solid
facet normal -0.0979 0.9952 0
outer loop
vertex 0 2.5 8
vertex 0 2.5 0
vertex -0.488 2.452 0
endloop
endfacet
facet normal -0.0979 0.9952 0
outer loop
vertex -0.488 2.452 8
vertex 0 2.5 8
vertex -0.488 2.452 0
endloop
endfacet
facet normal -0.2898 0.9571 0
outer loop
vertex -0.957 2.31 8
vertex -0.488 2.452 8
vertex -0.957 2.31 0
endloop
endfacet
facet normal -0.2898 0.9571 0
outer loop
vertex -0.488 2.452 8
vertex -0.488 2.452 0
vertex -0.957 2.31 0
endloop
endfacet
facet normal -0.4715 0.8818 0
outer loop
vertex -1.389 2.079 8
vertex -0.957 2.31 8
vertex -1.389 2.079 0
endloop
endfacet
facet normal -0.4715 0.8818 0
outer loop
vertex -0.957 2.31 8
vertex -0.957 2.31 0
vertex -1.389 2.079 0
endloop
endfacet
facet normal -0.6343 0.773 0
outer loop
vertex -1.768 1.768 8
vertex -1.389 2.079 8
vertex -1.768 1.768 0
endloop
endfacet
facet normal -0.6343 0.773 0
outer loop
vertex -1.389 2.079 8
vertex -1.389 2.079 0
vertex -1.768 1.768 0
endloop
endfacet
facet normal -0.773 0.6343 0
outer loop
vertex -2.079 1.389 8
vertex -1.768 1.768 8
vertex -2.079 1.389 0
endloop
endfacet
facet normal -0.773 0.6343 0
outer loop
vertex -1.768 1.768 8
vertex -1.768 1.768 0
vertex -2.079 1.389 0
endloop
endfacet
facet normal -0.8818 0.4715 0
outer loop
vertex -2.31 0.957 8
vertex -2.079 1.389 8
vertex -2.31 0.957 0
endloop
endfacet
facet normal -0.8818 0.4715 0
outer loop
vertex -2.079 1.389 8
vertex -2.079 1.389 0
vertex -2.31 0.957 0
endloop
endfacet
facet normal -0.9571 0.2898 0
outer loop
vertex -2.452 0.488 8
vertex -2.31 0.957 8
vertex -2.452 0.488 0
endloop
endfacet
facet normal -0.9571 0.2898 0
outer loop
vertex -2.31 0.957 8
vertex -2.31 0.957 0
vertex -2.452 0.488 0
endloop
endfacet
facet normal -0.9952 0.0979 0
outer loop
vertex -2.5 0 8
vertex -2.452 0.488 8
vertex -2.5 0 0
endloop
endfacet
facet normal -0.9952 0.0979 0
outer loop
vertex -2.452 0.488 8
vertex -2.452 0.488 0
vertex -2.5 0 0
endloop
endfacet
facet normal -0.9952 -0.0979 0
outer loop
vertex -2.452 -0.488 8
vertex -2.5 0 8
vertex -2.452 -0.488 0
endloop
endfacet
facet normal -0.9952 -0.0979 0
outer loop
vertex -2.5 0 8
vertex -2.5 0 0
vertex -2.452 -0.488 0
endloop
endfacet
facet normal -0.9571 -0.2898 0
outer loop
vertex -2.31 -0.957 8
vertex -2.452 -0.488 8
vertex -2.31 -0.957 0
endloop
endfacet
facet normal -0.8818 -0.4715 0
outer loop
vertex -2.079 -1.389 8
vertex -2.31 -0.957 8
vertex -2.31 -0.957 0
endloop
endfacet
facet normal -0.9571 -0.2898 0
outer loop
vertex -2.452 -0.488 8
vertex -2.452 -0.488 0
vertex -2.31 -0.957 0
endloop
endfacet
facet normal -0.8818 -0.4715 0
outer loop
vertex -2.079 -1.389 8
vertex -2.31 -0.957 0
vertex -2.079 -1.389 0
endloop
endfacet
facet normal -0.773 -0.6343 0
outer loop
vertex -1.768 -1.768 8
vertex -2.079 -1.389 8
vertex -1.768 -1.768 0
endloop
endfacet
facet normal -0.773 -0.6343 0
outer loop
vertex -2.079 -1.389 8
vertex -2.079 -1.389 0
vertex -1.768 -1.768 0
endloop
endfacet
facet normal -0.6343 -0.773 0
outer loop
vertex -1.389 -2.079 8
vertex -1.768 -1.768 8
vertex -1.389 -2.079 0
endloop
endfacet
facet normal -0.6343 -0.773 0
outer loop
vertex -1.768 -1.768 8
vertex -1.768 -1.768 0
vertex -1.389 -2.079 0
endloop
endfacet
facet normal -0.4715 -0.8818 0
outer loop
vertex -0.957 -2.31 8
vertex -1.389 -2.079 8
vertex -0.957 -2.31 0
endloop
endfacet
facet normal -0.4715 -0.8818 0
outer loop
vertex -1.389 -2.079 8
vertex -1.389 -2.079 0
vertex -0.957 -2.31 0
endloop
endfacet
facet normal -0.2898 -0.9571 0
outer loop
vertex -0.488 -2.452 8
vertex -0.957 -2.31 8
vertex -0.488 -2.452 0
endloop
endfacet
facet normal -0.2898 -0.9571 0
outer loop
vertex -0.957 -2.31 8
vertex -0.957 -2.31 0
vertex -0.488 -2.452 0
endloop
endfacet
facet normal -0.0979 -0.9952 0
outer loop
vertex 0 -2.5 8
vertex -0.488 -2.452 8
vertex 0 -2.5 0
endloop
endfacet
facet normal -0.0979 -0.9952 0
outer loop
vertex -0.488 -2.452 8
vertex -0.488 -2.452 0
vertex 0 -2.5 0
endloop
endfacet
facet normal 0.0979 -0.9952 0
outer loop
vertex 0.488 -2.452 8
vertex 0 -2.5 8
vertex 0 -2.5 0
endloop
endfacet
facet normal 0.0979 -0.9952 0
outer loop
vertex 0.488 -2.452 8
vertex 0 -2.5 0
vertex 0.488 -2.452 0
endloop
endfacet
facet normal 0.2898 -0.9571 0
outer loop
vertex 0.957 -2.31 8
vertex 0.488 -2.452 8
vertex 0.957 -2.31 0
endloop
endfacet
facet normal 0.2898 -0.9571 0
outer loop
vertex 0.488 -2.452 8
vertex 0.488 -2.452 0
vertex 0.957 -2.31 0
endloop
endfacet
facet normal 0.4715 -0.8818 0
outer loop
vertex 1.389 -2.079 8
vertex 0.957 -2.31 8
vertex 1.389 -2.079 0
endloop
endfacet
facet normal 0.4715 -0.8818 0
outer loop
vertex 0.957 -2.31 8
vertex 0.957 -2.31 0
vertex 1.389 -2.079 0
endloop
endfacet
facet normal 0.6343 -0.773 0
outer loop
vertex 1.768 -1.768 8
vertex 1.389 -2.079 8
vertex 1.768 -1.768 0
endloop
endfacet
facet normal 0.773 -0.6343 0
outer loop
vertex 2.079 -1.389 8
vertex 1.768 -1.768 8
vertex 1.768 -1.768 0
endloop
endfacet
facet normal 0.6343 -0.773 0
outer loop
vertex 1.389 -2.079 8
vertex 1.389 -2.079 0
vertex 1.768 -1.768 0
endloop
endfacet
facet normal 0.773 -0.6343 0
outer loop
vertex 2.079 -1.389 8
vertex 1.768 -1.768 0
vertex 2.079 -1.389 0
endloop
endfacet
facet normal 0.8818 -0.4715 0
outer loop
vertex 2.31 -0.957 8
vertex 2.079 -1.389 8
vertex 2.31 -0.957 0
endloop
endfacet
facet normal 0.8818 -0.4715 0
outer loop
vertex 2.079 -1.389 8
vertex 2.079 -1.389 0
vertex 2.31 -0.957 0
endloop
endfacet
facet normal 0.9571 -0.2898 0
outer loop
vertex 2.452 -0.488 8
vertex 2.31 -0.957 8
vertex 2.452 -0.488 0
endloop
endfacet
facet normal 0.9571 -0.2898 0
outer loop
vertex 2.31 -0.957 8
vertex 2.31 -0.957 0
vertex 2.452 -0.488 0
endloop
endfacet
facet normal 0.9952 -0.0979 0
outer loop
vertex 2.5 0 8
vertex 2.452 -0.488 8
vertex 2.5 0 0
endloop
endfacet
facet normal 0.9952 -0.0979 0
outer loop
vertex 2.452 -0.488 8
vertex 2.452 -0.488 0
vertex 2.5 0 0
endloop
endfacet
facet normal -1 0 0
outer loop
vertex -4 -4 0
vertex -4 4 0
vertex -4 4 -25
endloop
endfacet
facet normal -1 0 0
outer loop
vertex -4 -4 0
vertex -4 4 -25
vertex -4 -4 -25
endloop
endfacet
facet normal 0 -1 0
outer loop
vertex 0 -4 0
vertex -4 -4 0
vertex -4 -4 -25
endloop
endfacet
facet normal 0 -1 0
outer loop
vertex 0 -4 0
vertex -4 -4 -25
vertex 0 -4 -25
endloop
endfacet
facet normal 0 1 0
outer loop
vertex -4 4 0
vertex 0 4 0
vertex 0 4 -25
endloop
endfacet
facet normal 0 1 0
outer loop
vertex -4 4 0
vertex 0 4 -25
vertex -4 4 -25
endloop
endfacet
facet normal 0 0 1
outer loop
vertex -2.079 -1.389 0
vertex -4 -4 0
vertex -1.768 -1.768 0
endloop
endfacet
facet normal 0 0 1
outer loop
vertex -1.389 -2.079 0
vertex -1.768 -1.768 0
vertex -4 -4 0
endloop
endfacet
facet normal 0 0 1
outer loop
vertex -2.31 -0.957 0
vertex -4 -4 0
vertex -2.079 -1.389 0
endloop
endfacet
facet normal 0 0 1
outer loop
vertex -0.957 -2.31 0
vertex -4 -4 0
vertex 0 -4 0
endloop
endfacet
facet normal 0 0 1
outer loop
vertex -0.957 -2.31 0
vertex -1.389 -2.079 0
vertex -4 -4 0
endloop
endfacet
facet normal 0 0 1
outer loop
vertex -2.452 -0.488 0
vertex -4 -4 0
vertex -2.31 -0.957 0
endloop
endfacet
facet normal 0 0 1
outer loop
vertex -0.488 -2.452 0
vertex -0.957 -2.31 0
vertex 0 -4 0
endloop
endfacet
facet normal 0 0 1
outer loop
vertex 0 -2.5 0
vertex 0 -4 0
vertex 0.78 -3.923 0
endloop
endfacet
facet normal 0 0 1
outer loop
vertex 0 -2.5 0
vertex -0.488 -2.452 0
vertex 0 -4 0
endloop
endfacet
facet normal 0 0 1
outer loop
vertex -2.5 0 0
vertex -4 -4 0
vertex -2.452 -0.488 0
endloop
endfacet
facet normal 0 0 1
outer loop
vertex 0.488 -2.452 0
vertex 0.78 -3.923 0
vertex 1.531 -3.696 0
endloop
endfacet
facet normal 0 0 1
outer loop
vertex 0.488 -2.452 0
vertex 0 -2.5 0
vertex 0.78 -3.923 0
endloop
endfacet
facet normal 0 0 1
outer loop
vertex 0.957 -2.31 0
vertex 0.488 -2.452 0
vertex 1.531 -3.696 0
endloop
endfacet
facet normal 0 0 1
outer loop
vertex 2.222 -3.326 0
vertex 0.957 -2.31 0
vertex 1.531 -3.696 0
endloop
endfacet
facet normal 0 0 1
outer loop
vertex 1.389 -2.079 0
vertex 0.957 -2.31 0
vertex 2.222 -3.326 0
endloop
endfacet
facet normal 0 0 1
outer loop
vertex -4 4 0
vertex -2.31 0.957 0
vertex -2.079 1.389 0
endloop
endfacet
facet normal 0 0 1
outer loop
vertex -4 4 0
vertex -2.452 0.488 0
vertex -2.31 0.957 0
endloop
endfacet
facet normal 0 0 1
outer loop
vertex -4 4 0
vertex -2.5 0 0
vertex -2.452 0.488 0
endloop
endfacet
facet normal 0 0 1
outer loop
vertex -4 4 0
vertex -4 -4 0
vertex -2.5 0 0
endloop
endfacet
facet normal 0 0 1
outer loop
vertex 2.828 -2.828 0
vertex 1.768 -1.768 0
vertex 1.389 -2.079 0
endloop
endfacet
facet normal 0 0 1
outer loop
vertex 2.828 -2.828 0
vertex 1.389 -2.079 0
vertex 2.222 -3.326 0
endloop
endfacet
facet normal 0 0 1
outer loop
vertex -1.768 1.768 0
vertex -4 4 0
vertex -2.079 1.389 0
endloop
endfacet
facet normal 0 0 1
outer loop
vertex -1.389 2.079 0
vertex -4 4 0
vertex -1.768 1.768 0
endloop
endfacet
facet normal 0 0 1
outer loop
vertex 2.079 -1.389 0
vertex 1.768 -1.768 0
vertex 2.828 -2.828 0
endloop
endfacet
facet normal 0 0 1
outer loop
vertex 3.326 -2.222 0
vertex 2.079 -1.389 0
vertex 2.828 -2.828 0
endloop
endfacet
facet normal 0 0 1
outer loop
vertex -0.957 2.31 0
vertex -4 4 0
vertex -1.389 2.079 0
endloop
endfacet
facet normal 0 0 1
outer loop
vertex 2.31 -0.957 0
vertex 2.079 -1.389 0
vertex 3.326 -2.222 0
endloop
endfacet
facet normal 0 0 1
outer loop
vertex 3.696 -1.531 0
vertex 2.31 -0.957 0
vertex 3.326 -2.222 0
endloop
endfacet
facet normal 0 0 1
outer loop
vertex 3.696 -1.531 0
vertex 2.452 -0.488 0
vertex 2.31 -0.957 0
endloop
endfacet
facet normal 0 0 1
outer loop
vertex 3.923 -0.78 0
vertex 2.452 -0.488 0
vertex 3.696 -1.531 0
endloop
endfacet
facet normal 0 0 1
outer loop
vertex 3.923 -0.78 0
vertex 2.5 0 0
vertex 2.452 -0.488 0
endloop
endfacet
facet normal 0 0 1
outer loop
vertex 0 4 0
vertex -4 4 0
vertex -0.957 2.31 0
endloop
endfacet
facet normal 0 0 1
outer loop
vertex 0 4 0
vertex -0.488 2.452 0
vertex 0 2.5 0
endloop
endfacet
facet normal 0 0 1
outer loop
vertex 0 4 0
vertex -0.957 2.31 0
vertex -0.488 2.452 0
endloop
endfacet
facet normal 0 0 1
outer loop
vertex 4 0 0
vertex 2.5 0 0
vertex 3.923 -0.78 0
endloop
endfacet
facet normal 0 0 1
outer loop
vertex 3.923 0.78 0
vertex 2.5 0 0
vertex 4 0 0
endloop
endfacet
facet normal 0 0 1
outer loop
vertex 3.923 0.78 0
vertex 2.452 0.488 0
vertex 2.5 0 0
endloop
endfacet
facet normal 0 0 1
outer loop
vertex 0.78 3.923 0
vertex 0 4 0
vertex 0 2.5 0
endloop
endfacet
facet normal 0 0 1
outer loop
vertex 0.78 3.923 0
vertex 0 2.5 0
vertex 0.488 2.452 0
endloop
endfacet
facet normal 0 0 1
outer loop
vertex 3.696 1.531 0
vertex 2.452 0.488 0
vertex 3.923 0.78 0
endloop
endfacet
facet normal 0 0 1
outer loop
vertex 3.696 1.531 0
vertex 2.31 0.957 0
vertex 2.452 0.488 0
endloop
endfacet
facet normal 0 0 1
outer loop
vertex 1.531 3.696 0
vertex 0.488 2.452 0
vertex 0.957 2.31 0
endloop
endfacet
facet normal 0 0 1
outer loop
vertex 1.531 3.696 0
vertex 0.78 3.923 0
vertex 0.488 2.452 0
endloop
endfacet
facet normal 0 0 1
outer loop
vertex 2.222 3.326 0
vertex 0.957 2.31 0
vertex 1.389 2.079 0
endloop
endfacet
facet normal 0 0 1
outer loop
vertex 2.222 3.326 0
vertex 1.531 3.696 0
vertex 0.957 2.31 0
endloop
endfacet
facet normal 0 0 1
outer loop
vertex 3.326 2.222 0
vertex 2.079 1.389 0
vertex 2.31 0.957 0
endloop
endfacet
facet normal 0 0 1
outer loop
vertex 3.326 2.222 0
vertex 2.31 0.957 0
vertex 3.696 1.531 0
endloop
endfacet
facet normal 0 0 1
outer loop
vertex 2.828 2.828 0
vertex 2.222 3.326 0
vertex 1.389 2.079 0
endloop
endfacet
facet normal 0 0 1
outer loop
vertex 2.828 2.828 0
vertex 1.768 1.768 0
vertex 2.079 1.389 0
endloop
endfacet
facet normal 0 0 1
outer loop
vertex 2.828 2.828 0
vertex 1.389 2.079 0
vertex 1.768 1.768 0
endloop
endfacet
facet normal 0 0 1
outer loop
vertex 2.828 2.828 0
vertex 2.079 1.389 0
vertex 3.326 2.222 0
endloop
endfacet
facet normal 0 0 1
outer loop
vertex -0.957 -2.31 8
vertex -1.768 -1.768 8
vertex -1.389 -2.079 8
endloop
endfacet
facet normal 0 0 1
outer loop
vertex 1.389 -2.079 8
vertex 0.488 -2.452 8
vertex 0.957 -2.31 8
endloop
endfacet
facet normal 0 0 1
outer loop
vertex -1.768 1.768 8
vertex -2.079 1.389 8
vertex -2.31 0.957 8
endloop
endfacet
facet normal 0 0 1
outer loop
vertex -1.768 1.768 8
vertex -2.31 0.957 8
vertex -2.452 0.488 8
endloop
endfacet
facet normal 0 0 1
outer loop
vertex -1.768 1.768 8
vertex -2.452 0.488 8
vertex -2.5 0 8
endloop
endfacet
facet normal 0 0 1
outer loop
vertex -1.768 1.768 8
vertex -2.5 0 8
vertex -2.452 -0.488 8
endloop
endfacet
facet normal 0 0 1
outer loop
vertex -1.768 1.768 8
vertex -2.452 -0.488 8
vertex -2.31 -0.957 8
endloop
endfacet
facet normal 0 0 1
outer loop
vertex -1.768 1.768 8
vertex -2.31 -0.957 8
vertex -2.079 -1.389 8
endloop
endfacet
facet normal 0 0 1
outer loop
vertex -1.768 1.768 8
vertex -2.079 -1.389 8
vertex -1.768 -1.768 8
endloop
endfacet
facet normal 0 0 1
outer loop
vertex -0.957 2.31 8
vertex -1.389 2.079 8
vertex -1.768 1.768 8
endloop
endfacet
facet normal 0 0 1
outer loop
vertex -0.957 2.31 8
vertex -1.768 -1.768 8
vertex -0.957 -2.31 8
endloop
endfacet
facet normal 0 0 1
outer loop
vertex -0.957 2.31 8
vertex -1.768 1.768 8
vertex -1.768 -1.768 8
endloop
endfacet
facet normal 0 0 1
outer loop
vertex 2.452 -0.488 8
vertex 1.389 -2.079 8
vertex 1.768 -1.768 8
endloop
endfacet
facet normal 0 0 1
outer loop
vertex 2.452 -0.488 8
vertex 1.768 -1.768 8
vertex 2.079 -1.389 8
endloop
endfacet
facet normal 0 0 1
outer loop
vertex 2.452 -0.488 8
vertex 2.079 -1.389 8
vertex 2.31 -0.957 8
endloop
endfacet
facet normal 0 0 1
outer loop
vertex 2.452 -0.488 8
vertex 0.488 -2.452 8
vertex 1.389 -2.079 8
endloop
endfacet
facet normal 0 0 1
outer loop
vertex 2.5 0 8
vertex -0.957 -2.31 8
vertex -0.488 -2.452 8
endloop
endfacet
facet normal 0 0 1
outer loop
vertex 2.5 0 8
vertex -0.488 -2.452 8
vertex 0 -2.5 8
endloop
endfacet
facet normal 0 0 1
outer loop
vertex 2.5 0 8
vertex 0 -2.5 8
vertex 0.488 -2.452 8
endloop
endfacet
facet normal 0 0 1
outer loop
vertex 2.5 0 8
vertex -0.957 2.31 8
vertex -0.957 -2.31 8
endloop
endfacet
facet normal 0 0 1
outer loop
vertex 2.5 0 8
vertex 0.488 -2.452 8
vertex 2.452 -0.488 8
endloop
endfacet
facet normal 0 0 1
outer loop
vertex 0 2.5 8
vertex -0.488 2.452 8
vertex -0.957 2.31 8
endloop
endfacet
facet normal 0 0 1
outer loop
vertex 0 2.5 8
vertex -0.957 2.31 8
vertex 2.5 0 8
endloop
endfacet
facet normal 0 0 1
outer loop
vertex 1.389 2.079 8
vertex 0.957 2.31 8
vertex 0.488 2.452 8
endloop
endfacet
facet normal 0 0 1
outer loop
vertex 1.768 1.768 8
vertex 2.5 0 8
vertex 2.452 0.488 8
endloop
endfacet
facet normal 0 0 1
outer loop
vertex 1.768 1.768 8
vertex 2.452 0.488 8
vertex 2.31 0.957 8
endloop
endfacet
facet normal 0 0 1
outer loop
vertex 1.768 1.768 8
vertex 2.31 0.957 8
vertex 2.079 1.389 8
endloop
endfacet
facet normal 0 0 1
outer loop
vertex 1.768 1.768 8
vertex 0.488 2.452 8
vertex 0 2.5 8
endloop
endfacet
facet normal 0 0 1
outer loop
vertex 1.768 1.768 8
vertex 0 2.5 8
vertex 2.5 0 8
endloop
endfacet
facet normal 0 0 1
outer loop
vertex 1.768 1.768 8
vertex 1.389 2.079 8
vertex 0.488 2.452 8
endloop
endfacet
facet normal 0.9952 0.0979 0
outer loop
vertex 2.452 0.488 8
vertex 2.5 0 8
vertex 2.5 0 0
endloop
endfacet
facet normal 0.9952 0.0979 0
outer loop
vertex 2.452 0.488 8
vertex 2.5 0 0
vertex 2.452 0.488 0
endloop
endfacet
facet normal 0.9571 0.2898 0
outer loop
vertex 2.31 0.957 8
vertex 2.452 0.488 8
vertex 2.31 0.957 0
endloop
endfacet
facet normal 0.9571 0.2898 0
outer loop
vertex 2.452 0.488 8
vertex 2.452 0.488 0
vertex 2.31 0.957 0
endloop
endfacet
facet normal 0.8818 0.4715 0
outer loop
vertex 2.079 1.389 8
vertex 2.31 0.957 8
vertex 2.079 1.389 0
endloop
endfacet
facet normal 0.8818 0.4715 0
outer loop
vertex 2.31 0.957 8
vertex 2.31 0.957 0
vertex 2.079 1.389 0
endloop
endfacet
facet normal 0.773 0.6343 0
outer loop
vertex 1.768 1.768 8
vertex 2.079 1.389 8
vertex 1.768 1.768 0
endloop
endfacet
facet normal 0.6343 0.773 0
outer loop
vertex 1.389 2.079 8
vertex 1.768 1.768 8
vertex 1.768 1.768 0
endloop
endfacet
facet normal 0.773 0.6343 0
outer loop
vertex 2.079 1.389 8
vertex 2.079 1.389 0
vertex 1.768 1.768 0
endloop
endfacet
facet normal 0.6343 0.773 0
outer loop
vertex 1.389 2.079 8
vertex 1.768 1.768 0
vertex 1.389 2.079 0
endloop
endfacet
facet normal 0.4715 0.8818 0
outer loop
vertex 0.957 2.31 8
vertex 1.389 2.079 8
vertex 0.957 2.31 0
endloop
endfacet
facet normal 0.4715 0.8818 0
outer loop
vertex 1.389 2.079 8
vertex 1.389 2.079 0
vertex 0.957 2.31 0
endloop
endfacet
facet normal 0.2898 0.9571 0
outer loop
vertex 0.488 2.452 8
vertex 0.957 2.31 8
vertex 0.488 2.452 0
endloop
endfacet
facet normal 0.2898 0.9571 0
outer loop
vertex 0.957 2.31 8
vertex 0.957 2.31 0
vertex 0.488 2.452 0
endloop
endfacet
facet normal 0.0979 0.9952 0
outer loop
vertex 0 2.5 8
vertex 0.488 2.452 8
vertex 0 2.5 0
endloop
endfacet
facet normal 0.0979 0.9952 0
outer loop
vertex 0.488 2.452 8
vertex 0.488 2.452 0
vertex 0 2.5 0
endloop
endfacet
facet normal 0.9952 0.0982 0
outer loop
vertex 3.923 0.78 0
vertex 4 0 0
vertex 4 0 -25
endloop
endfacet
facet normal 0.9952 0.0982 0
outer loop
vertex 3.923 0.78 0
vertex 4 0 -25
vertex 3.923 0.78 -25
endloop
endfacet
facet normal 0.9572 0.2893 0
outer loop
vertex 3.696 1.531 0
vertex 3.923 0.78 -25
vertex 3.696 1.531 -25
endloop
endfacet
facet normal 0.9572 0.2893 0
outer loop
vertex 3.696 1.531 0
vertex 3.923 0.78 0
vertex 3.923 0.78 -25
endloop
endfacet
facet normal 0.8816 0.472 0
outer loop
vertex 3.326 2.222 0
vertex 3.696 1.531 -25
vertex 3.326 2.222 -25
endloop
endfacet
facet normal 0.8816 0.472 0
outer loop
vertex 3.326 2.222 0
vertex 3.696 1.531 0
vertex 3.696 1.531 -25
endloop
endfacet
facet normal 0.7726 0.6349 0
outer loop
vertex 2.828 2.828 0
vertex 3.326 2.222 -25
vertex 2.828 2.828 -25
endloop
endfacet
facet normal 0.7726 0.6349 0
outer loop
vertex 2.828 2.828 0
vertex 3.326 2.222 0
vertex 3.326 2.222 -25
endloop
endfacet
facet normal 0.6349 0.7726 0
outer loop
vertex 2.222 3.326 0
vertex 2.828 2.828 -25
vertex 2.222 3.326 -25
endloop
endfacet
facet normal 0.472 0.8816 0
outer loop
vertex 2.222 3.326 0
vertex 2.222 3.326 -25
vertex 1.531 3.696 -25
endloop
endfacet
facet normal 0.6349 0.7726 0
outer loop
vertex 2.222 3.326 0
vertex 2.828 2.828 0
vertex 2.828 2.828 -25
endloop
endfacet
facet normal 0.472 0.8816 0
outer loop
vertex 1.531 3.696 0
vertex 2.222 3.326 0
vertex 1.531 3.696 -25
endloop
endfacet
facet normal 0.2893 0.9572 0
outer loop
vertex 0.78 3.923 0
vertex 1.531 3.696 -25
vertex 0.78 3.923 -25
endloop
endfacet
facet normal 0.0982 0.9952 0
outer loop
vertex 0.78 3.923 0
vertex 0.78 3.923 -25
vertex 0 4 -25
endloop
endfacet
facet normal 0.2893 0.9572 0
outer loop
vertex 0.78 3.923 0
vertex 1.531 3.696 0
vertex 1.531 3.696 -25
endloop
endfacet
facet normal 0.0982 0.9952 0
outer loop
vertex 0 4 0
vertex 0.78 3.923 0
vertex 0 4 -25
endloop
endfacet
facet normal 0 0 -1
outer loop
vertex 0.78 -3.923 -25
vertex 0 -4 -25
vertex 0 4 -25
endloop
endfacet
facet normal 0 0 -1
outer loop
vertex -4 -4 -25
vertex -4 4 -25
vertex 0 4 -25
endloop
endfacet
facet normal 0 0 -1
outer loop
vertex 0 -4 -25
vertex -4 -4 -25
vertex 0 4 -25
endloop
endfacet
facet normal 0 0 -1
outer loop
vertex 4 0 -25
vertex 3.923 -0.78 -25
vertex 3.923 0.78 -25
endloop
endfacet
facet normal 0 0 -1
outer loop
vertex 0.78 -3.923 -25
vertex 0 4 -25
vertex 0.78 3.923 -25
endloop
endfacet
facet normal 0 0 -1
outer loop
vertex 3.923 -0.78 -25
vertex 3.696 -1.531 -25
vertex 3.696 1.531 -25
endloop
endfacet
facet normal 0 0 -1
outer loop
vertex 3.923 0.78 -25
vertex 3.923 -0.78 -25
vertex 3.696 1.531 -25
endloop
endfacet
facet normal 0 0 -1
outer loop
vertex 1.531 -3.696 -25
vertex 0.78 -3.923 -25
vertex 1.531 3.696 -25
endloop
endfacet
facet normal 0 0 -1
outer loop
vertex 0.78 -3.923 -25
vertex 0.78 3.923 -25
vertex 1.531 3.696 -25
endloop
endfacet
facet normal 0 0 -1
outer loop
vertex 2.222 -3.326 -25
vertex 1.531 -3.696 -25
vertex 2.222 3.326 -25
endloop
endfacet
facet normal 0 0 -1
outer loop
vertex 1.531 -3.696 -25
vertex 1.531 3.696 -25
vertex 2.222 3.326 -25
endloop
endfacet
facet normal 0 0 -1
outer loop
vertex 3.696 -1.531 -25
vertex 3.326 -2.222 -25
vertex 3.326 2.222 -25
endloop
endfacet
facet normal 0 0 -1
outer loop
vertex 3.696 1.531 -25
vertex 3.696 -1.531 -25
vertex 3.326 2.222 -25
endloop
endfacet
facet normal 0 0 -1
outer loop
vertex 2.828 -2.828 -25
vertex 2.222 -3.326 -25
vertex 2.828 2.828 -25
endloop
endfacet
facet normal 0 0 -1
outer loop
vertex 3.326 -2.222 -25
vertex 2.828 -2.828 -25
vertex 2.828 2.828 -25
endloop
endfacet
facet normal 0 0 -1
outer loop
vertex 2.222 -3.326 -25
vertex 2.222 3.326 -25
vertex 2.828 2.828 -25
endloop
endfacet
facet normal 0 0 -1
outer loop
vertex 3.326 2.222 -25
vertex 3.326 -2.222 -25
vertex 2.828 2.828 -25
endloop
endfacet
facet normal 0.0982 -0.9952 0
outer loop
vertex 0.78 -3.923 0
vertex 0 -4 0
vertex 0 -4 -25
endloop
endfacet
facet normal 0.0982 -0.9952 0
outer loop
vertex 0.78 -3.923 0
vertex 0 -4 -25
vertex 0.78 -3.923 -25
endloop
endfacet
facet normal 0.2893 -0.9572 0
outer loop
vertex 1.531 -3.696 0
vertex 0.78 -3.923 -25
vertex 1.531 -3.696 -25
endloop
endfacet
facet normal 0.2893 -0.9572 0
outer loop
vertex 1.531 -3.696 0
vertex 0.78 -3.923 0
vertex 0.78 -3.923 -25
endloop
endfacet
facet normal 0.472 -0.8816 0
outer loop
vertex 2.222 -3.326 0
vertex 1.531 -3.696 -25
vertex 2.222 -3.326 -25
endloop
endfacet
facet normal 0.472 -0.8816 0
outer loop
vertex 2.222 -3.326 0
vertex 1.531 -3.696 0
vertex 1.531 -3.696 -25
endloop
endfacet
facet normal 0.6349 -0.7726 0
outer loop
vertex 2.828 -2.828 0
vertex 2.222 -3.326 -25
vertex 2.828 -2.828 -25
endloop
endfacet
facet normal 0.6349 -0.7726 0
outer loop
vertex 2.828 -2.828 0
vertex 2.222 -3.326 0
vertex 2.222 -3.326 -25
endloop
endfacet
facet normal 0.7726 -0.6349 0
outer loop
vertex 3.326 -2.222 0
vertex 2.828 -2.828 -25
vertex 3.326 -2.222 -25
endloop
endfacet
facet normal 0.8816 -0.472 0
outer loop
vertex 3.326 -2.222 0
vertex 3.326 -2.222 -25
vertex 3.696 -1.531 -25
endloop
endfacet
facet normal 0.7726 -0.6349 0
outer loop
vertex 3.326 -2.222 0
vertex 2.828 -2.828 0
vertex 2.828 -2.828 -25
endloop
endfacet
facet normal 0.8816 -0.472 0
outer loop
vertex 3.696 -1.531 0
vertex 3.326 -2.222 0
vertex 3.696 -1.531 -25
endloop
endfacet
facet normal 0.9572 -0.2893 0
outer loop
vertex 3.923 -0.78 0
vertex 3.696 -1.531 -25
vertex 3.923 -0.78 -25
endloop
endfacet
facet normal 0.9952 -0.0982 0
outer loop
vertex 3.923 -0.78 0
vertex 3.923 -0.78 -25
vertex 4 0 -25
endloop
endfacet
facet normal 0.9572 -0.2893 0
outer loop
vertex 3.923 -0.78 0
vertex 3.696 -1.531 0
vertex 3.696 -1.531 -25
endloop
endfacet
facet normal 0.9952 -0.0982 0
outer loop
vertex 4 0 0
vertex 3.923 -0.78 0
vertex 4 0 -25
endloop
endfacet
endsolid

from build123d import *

# Parameters (mm, degrees)
F1_DEPTH = 25
F2_DEPTH = 8


with BuildPart() as f1:
    # F0 (on Top) → F1 (new body)
    with BuildSketch(Plane.XY):
        with BuildLine():
            ThreePointArc((0, -4), (2.828427, -2.828427), (4, 0))
            ThreePointArc((4, 0), (2.828427, 2.828427), (0, 4))
            Line((0, 4), (0, 2.5))
            ThreePointArc((0, 2.5), (1.767767, 1.767767), (2.5, 0))
            ThreePointArc((2.5, 0), (1.767767, -1.767767), (0, -2.5))
            Line((0, -2.5), (0, -4))
        make_face()
        with BuildLine():
            Line((0, 2.5), (0, 4))
            ThreePointArc((0, 4), (-2.828427, 2.828427), (-4, 0))
            ThreePointArc((-4, 0), (-2.828427, -2.828427), (0, -4))
            Line((0, -4), (0, -2.5))
            ThreePointArc((0, -2.5), (-2.5, 0), (0, 2.5))
        make_face()
        with BuildLine():
            Line((-4, -4), (0, -4))
            ThreePointArc((0, -4), (-2.828427, -2.828427), (-4, 0))
            Line((-4, 0), (-4, -4))
        make_face()
        with BuildLine():
            ThreePointArc((-4, 0), (-2.828427, 2.828427), (0, 4))
            Line((0, 4), (-4, 4))
            Line((-4, 4), (-4, 0))
        make_face()
        with BuildLine():
            ThreePointArc((2.5, 0), (1.767767, 1.767767), (0, 2.5))
            Line((0, 2.5), (0, -2.5))
            ThreePointArc((0, -2.5), (1.767767, -1.767767), (2.5, 0))
        make_face()
        with BuildLine():
            Line((0, -2.5), (0, 2.5))
            ThreePointArc((0, 2.5), (-2.5, 0), (0, -2.5))
        make_face()
    extrude(amount=-F1_DEPTH)

    # F0 (on Top) → F2 (join)
    with BuildSketch(Plane.XY):
        with BuildLine():
            Line((0, -2.5), (0, 2.5))
            ThreePointArc((0, 2.5), (-2.5, 0), (0, -2.5))
        make_face()
        with BuildLine():
            ThreePointArc((2.5, 0), (1.767767, 1.767767), (0, 2.5))
            Line((0, 2.5), (0, -2.5))
            ThreePointArc((0, -2.5), (1.767767, -1.767767), (2.5, 0))
        make_face()
    extrude(amount=F2_DEPTH)


solid = f1.part
